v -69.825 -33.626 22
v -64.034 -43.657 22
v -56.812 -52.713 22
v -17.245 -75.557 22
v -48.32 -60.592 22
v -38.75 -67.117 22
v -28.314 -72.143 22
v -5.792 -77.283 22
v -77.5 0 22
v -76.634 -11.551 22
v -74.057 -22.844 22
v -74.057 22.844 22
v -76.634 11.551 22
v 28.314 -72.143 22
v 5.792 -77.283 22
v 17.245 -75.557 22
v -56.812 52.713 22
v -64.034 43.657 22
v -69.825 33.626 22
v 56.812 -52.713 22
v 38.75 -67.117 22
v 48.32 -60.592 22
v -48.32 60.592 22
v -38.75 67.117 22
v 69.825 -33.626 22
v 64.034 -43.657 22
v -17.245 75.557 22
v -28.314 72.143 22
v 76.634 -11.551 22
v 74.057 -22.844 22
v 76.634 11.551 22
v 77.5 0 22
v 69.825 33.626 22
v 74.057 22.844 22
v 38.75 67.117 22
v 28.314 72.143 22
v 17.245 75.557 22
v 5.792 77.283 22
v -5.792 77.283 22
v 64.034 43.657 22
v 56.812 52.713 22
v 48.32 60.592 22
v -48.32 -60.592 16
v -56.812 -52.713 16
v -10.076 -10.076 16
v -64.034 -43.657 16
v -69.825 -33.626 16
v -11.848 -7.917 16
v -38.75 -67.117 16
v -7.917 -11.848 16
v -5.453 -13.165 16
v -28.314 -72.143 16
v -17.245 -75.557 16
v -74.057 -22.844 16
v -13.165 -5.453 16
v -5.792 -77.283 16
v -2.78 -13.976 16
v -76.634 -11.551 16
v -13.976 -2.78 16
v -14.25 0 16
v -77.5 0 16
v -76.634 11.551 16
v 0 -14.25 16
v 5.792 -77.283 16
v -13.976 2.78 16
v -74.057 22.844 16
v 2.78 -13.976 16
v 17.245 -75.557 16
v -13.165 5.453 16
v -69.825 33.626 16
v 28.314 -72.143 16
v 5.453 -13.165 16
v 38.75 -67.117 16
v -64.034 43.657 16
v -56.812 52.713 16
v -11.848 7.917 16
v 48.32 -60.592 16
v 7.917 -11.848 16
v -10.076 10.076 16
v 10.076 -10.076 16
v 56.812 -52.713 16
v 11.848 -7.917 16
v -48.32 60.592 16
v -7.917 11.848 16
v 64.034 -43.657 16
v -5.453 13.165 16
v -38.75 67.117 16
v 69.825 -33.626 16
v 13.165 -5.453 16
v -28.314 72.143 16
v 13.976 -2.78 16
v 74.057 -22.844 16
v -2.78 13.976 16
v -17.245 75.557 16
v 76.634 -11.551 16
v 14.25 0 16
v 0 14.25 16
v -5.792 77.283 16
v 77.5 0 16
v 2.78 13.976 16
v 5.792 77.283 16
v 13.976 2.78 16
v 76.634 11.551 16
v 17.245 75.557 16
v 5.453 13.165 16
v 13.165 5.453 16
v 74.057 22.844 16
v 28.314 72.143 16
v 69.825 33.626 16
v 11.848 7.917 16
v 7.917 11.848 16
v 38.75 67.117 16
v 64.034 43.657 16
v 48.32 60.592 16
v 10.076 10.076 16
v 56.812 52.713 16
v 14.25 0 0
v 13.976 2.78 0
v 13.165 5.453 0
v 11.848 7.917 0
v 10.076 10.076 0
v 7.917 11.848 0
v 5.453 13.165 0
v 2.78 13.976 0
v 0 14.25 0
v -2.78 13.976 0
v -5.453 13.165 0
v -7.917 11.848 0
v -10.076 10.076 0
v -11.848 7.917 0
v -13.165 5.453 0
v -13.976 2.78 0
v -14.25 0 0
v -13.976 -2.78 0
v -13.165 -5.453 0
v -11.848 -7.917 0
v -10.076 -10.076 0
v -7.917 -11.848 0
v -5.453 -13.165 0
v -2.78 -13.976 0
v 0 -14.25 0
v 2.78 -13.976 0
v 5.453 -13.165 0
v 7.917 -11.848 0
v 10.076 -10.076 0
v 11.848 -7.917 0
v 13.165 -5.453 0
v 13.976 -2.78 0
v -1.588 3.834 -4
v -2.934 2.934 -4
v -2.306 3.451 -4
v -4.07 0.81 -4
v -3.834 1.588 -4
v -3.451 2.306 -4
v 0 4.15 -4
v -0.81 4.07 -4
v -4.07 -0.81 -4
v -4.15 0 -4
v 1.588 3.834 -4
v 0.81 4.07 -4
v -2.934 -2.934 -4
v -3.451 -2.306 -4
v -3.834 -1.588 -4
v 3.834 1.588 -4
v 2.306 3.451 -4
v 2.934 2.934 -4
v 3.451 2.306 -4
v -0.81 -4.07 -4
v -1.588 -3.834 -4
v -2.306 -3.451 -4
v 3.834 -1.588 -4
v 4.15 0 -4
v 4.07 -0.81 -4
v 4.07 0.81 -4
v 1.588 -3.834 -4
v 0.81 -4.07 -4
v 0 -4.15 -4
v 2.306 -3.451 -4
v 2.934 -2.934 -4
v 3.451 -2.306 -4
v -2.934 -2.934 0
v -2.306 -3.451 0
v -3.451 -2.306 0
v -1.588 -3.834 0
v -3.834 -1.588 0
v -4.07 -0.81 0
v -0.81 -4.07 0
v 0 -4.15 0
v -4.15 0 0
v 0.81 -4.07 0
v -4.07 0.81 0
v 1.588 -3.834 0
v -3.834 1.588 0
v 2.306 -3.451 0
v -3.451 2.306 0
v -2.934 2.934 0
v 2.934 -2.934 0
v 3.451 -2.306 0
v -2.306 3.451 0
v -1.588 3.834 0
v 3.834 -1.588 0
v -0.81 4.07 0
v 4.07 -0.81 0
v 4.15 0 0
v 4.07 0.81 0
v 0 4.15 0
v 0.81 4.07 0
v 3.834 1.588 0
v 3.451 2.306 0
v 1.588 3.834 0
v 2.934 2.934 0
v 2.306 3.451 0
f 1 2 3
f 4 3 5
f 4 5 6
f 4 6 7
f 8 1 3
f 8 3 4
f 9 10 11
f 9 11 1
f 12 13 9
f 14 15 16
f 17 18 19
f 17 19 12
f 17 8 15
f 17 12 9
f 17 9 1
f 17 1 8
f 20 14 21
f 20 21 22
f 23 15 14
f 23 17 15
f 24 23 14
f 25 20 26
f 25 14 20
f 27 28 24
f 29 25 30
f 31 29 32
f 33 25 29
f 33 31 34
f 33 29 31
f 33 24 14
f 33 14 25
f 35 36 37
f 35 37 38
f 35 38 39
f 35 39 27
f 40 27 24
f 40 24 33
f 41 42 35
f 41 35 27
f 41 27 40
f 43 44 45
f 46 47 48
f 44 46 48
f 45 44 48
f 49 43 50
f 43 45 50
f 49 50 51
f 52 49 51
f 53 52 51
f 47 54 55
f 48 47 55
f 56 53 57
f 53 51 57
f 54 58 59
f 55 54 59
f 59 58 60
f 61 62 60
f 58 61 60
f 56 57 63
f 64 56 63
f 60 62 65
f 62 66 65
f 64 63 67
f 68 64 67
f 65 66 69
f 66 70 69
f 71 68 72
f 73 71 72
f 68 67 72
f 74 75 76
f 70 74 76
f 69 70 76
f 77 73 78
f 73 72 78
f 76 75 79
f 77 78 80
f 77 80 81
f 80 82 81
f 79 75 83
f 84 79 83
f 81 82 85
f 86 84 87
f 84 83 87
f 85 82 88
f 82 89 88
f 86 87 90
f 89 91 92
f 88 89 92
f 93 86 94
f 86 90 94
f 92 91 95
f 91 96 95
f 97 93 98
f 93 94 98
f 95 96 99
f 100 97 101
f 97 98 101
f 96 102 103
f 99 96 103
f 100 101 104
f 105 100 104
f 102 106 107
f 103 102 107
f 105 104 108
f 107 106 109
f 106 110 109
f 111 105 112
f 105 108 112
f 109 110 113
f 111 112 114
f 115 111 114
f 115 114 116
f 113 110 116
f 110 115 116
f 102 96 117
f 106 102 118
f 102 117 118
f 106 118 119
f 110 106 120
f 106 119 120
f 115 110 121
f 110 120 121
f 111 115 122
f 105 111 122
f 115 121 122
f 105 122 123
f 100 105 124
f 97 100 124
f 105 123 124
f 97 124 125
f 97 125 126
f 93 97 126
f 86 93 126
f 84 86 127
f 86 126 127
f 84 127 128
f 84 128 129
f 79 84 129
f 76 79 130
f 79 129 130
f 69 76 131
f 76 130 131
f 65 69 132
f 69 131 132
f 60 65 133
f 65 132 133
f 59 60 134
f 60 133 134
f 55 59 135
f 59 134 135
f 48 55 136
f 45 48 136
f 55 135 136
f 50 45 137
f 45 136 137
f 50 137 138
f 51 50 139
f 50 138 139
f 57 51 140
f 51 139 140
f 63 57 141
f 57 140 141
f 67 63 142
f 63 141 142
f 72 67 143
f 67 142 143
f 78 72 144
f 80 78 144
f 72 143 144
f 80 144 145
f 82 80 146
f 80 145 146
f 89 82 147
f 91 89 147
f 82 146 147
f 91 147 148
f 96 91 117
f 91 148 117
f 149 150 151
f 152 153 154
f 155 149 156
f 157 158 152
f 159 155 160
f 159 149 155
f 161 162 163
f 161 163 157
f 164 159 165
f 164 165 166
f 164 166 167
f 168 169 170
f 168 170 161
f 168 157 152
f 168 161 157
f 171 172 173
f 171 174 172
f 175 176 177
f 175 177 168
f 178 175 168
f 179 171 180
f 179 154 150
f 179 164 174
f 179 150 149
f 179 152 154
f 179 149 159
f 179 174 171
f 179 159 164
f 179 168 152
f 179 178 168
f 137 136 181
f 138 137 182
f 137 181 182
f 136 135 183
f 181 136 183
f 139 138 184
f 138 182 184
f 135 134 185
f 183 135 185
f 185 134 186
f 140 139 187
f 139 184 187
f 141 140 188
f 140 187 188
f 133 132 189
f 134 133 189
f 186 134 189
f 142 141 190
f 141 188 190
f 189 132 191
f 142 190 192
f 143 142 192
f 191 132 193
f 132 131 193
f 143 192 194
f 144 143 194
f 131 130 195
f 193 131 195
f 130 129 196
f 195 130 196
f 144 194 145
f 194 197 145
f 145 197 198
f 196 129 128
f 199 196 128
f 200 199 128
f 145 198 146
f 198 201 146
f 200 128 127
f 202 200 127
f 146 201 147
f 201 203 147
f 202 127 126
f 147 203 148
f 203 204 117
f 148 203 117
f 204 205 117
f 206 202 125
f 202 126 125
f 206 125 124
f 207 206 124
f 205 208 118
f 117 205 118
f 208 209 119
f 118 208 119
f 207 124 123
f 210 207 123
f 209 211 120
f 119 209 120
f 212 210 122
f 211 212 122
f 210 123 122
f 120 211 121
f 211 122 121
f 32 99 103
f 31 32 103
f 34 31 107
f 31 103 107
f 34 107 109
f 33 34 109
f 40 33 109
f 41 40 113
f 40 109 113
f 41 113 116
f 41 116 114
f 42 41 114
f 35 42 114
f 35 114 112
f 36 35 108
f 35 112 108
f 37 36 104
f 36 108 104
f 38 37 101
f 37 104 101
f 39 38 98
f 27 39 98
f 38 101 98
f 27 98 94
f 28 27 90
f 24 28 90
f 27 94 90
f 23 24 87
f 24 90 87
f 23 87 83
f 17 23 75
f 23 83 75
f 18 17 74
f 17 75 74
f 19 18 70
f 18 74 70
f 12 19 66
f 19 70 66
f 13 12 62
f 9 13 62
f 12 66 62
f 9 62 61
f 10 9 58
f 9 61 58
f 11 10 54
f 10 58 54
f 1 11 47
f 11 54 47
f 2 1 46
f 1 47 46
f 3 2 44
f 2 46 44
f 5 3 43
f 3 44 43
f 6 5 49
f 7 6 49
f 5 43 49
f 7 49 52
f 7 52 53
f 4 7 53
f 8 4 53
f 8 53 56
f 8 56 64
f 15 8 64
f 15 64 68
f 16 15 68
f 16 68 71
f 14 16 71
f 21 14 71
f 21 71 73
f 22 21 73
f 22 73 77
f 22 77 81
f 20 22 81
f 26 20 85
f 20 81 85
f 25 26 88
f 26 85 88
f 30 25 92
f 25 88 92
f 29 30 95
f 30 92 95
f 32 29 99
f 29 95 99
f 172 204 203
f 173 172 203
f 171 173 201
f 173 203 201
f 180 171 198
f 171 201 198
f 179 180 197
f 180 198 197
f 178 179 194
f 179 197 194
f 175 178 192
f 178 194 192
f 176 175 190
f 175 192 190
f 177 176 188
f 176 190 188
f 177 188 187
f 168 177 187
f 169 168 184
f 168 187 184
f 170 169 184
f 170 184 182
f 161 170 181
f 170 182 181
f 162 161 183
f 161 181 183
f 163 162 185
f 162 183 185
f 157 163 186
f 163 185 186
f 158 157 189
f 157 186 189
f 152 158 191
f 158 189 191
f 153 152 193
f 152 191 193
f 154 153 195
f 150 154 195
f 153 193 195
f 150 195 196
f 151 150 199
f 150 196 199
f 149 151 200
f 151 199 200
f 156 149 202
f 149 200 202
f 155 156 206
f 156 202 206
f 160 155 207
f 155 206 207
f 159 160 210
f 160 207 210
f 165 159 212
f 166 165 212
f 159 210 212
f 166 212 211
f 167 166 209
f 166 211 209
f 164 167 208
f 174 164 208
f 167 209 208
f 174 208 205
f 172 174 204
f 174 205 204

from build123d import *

# Parameters (mm, degrees)
F0_R     = 14.25
F0_R_2   = 2.5
F1_DEPTH = 16
F2_DEPTH = 19
F3_R     = 77.5
F4_DEPTH = 6
F5_R     = 4.15
F6_DEPTH = 4


with BuildPart() as f1:
    # F0 (on Top) → F1 (new body)
    with BuildSketch(Plane.XY):
        Circle(F0_R)
        Circle(F0_R_2, mode=Mode.SUBTRACT)
    extrude(amount=F1_DEPTH)

    # F0 (on Top) → F2 (join)
    with BuildSketch(Plane.XY):
        Circle(F0_R_2)
    extrude(amount=F2_DEPTH)

    # F3 (on face) → F4 (join)
    with BuildSketch(Plane.XY.offset(16)):
        Circle(F3_R)
    extrude(amount=F4_DEPTH)

    # F5 (on face) → F6 (join)
    with BuildSketch(Plane(origin=(0, 0, 0), x_dir=(1, 0, 0), z_dir=(0, 0, -1))):
        Circle(F5_R)
    extrude(amount=F6_DEPTH)


solid = f1.part
